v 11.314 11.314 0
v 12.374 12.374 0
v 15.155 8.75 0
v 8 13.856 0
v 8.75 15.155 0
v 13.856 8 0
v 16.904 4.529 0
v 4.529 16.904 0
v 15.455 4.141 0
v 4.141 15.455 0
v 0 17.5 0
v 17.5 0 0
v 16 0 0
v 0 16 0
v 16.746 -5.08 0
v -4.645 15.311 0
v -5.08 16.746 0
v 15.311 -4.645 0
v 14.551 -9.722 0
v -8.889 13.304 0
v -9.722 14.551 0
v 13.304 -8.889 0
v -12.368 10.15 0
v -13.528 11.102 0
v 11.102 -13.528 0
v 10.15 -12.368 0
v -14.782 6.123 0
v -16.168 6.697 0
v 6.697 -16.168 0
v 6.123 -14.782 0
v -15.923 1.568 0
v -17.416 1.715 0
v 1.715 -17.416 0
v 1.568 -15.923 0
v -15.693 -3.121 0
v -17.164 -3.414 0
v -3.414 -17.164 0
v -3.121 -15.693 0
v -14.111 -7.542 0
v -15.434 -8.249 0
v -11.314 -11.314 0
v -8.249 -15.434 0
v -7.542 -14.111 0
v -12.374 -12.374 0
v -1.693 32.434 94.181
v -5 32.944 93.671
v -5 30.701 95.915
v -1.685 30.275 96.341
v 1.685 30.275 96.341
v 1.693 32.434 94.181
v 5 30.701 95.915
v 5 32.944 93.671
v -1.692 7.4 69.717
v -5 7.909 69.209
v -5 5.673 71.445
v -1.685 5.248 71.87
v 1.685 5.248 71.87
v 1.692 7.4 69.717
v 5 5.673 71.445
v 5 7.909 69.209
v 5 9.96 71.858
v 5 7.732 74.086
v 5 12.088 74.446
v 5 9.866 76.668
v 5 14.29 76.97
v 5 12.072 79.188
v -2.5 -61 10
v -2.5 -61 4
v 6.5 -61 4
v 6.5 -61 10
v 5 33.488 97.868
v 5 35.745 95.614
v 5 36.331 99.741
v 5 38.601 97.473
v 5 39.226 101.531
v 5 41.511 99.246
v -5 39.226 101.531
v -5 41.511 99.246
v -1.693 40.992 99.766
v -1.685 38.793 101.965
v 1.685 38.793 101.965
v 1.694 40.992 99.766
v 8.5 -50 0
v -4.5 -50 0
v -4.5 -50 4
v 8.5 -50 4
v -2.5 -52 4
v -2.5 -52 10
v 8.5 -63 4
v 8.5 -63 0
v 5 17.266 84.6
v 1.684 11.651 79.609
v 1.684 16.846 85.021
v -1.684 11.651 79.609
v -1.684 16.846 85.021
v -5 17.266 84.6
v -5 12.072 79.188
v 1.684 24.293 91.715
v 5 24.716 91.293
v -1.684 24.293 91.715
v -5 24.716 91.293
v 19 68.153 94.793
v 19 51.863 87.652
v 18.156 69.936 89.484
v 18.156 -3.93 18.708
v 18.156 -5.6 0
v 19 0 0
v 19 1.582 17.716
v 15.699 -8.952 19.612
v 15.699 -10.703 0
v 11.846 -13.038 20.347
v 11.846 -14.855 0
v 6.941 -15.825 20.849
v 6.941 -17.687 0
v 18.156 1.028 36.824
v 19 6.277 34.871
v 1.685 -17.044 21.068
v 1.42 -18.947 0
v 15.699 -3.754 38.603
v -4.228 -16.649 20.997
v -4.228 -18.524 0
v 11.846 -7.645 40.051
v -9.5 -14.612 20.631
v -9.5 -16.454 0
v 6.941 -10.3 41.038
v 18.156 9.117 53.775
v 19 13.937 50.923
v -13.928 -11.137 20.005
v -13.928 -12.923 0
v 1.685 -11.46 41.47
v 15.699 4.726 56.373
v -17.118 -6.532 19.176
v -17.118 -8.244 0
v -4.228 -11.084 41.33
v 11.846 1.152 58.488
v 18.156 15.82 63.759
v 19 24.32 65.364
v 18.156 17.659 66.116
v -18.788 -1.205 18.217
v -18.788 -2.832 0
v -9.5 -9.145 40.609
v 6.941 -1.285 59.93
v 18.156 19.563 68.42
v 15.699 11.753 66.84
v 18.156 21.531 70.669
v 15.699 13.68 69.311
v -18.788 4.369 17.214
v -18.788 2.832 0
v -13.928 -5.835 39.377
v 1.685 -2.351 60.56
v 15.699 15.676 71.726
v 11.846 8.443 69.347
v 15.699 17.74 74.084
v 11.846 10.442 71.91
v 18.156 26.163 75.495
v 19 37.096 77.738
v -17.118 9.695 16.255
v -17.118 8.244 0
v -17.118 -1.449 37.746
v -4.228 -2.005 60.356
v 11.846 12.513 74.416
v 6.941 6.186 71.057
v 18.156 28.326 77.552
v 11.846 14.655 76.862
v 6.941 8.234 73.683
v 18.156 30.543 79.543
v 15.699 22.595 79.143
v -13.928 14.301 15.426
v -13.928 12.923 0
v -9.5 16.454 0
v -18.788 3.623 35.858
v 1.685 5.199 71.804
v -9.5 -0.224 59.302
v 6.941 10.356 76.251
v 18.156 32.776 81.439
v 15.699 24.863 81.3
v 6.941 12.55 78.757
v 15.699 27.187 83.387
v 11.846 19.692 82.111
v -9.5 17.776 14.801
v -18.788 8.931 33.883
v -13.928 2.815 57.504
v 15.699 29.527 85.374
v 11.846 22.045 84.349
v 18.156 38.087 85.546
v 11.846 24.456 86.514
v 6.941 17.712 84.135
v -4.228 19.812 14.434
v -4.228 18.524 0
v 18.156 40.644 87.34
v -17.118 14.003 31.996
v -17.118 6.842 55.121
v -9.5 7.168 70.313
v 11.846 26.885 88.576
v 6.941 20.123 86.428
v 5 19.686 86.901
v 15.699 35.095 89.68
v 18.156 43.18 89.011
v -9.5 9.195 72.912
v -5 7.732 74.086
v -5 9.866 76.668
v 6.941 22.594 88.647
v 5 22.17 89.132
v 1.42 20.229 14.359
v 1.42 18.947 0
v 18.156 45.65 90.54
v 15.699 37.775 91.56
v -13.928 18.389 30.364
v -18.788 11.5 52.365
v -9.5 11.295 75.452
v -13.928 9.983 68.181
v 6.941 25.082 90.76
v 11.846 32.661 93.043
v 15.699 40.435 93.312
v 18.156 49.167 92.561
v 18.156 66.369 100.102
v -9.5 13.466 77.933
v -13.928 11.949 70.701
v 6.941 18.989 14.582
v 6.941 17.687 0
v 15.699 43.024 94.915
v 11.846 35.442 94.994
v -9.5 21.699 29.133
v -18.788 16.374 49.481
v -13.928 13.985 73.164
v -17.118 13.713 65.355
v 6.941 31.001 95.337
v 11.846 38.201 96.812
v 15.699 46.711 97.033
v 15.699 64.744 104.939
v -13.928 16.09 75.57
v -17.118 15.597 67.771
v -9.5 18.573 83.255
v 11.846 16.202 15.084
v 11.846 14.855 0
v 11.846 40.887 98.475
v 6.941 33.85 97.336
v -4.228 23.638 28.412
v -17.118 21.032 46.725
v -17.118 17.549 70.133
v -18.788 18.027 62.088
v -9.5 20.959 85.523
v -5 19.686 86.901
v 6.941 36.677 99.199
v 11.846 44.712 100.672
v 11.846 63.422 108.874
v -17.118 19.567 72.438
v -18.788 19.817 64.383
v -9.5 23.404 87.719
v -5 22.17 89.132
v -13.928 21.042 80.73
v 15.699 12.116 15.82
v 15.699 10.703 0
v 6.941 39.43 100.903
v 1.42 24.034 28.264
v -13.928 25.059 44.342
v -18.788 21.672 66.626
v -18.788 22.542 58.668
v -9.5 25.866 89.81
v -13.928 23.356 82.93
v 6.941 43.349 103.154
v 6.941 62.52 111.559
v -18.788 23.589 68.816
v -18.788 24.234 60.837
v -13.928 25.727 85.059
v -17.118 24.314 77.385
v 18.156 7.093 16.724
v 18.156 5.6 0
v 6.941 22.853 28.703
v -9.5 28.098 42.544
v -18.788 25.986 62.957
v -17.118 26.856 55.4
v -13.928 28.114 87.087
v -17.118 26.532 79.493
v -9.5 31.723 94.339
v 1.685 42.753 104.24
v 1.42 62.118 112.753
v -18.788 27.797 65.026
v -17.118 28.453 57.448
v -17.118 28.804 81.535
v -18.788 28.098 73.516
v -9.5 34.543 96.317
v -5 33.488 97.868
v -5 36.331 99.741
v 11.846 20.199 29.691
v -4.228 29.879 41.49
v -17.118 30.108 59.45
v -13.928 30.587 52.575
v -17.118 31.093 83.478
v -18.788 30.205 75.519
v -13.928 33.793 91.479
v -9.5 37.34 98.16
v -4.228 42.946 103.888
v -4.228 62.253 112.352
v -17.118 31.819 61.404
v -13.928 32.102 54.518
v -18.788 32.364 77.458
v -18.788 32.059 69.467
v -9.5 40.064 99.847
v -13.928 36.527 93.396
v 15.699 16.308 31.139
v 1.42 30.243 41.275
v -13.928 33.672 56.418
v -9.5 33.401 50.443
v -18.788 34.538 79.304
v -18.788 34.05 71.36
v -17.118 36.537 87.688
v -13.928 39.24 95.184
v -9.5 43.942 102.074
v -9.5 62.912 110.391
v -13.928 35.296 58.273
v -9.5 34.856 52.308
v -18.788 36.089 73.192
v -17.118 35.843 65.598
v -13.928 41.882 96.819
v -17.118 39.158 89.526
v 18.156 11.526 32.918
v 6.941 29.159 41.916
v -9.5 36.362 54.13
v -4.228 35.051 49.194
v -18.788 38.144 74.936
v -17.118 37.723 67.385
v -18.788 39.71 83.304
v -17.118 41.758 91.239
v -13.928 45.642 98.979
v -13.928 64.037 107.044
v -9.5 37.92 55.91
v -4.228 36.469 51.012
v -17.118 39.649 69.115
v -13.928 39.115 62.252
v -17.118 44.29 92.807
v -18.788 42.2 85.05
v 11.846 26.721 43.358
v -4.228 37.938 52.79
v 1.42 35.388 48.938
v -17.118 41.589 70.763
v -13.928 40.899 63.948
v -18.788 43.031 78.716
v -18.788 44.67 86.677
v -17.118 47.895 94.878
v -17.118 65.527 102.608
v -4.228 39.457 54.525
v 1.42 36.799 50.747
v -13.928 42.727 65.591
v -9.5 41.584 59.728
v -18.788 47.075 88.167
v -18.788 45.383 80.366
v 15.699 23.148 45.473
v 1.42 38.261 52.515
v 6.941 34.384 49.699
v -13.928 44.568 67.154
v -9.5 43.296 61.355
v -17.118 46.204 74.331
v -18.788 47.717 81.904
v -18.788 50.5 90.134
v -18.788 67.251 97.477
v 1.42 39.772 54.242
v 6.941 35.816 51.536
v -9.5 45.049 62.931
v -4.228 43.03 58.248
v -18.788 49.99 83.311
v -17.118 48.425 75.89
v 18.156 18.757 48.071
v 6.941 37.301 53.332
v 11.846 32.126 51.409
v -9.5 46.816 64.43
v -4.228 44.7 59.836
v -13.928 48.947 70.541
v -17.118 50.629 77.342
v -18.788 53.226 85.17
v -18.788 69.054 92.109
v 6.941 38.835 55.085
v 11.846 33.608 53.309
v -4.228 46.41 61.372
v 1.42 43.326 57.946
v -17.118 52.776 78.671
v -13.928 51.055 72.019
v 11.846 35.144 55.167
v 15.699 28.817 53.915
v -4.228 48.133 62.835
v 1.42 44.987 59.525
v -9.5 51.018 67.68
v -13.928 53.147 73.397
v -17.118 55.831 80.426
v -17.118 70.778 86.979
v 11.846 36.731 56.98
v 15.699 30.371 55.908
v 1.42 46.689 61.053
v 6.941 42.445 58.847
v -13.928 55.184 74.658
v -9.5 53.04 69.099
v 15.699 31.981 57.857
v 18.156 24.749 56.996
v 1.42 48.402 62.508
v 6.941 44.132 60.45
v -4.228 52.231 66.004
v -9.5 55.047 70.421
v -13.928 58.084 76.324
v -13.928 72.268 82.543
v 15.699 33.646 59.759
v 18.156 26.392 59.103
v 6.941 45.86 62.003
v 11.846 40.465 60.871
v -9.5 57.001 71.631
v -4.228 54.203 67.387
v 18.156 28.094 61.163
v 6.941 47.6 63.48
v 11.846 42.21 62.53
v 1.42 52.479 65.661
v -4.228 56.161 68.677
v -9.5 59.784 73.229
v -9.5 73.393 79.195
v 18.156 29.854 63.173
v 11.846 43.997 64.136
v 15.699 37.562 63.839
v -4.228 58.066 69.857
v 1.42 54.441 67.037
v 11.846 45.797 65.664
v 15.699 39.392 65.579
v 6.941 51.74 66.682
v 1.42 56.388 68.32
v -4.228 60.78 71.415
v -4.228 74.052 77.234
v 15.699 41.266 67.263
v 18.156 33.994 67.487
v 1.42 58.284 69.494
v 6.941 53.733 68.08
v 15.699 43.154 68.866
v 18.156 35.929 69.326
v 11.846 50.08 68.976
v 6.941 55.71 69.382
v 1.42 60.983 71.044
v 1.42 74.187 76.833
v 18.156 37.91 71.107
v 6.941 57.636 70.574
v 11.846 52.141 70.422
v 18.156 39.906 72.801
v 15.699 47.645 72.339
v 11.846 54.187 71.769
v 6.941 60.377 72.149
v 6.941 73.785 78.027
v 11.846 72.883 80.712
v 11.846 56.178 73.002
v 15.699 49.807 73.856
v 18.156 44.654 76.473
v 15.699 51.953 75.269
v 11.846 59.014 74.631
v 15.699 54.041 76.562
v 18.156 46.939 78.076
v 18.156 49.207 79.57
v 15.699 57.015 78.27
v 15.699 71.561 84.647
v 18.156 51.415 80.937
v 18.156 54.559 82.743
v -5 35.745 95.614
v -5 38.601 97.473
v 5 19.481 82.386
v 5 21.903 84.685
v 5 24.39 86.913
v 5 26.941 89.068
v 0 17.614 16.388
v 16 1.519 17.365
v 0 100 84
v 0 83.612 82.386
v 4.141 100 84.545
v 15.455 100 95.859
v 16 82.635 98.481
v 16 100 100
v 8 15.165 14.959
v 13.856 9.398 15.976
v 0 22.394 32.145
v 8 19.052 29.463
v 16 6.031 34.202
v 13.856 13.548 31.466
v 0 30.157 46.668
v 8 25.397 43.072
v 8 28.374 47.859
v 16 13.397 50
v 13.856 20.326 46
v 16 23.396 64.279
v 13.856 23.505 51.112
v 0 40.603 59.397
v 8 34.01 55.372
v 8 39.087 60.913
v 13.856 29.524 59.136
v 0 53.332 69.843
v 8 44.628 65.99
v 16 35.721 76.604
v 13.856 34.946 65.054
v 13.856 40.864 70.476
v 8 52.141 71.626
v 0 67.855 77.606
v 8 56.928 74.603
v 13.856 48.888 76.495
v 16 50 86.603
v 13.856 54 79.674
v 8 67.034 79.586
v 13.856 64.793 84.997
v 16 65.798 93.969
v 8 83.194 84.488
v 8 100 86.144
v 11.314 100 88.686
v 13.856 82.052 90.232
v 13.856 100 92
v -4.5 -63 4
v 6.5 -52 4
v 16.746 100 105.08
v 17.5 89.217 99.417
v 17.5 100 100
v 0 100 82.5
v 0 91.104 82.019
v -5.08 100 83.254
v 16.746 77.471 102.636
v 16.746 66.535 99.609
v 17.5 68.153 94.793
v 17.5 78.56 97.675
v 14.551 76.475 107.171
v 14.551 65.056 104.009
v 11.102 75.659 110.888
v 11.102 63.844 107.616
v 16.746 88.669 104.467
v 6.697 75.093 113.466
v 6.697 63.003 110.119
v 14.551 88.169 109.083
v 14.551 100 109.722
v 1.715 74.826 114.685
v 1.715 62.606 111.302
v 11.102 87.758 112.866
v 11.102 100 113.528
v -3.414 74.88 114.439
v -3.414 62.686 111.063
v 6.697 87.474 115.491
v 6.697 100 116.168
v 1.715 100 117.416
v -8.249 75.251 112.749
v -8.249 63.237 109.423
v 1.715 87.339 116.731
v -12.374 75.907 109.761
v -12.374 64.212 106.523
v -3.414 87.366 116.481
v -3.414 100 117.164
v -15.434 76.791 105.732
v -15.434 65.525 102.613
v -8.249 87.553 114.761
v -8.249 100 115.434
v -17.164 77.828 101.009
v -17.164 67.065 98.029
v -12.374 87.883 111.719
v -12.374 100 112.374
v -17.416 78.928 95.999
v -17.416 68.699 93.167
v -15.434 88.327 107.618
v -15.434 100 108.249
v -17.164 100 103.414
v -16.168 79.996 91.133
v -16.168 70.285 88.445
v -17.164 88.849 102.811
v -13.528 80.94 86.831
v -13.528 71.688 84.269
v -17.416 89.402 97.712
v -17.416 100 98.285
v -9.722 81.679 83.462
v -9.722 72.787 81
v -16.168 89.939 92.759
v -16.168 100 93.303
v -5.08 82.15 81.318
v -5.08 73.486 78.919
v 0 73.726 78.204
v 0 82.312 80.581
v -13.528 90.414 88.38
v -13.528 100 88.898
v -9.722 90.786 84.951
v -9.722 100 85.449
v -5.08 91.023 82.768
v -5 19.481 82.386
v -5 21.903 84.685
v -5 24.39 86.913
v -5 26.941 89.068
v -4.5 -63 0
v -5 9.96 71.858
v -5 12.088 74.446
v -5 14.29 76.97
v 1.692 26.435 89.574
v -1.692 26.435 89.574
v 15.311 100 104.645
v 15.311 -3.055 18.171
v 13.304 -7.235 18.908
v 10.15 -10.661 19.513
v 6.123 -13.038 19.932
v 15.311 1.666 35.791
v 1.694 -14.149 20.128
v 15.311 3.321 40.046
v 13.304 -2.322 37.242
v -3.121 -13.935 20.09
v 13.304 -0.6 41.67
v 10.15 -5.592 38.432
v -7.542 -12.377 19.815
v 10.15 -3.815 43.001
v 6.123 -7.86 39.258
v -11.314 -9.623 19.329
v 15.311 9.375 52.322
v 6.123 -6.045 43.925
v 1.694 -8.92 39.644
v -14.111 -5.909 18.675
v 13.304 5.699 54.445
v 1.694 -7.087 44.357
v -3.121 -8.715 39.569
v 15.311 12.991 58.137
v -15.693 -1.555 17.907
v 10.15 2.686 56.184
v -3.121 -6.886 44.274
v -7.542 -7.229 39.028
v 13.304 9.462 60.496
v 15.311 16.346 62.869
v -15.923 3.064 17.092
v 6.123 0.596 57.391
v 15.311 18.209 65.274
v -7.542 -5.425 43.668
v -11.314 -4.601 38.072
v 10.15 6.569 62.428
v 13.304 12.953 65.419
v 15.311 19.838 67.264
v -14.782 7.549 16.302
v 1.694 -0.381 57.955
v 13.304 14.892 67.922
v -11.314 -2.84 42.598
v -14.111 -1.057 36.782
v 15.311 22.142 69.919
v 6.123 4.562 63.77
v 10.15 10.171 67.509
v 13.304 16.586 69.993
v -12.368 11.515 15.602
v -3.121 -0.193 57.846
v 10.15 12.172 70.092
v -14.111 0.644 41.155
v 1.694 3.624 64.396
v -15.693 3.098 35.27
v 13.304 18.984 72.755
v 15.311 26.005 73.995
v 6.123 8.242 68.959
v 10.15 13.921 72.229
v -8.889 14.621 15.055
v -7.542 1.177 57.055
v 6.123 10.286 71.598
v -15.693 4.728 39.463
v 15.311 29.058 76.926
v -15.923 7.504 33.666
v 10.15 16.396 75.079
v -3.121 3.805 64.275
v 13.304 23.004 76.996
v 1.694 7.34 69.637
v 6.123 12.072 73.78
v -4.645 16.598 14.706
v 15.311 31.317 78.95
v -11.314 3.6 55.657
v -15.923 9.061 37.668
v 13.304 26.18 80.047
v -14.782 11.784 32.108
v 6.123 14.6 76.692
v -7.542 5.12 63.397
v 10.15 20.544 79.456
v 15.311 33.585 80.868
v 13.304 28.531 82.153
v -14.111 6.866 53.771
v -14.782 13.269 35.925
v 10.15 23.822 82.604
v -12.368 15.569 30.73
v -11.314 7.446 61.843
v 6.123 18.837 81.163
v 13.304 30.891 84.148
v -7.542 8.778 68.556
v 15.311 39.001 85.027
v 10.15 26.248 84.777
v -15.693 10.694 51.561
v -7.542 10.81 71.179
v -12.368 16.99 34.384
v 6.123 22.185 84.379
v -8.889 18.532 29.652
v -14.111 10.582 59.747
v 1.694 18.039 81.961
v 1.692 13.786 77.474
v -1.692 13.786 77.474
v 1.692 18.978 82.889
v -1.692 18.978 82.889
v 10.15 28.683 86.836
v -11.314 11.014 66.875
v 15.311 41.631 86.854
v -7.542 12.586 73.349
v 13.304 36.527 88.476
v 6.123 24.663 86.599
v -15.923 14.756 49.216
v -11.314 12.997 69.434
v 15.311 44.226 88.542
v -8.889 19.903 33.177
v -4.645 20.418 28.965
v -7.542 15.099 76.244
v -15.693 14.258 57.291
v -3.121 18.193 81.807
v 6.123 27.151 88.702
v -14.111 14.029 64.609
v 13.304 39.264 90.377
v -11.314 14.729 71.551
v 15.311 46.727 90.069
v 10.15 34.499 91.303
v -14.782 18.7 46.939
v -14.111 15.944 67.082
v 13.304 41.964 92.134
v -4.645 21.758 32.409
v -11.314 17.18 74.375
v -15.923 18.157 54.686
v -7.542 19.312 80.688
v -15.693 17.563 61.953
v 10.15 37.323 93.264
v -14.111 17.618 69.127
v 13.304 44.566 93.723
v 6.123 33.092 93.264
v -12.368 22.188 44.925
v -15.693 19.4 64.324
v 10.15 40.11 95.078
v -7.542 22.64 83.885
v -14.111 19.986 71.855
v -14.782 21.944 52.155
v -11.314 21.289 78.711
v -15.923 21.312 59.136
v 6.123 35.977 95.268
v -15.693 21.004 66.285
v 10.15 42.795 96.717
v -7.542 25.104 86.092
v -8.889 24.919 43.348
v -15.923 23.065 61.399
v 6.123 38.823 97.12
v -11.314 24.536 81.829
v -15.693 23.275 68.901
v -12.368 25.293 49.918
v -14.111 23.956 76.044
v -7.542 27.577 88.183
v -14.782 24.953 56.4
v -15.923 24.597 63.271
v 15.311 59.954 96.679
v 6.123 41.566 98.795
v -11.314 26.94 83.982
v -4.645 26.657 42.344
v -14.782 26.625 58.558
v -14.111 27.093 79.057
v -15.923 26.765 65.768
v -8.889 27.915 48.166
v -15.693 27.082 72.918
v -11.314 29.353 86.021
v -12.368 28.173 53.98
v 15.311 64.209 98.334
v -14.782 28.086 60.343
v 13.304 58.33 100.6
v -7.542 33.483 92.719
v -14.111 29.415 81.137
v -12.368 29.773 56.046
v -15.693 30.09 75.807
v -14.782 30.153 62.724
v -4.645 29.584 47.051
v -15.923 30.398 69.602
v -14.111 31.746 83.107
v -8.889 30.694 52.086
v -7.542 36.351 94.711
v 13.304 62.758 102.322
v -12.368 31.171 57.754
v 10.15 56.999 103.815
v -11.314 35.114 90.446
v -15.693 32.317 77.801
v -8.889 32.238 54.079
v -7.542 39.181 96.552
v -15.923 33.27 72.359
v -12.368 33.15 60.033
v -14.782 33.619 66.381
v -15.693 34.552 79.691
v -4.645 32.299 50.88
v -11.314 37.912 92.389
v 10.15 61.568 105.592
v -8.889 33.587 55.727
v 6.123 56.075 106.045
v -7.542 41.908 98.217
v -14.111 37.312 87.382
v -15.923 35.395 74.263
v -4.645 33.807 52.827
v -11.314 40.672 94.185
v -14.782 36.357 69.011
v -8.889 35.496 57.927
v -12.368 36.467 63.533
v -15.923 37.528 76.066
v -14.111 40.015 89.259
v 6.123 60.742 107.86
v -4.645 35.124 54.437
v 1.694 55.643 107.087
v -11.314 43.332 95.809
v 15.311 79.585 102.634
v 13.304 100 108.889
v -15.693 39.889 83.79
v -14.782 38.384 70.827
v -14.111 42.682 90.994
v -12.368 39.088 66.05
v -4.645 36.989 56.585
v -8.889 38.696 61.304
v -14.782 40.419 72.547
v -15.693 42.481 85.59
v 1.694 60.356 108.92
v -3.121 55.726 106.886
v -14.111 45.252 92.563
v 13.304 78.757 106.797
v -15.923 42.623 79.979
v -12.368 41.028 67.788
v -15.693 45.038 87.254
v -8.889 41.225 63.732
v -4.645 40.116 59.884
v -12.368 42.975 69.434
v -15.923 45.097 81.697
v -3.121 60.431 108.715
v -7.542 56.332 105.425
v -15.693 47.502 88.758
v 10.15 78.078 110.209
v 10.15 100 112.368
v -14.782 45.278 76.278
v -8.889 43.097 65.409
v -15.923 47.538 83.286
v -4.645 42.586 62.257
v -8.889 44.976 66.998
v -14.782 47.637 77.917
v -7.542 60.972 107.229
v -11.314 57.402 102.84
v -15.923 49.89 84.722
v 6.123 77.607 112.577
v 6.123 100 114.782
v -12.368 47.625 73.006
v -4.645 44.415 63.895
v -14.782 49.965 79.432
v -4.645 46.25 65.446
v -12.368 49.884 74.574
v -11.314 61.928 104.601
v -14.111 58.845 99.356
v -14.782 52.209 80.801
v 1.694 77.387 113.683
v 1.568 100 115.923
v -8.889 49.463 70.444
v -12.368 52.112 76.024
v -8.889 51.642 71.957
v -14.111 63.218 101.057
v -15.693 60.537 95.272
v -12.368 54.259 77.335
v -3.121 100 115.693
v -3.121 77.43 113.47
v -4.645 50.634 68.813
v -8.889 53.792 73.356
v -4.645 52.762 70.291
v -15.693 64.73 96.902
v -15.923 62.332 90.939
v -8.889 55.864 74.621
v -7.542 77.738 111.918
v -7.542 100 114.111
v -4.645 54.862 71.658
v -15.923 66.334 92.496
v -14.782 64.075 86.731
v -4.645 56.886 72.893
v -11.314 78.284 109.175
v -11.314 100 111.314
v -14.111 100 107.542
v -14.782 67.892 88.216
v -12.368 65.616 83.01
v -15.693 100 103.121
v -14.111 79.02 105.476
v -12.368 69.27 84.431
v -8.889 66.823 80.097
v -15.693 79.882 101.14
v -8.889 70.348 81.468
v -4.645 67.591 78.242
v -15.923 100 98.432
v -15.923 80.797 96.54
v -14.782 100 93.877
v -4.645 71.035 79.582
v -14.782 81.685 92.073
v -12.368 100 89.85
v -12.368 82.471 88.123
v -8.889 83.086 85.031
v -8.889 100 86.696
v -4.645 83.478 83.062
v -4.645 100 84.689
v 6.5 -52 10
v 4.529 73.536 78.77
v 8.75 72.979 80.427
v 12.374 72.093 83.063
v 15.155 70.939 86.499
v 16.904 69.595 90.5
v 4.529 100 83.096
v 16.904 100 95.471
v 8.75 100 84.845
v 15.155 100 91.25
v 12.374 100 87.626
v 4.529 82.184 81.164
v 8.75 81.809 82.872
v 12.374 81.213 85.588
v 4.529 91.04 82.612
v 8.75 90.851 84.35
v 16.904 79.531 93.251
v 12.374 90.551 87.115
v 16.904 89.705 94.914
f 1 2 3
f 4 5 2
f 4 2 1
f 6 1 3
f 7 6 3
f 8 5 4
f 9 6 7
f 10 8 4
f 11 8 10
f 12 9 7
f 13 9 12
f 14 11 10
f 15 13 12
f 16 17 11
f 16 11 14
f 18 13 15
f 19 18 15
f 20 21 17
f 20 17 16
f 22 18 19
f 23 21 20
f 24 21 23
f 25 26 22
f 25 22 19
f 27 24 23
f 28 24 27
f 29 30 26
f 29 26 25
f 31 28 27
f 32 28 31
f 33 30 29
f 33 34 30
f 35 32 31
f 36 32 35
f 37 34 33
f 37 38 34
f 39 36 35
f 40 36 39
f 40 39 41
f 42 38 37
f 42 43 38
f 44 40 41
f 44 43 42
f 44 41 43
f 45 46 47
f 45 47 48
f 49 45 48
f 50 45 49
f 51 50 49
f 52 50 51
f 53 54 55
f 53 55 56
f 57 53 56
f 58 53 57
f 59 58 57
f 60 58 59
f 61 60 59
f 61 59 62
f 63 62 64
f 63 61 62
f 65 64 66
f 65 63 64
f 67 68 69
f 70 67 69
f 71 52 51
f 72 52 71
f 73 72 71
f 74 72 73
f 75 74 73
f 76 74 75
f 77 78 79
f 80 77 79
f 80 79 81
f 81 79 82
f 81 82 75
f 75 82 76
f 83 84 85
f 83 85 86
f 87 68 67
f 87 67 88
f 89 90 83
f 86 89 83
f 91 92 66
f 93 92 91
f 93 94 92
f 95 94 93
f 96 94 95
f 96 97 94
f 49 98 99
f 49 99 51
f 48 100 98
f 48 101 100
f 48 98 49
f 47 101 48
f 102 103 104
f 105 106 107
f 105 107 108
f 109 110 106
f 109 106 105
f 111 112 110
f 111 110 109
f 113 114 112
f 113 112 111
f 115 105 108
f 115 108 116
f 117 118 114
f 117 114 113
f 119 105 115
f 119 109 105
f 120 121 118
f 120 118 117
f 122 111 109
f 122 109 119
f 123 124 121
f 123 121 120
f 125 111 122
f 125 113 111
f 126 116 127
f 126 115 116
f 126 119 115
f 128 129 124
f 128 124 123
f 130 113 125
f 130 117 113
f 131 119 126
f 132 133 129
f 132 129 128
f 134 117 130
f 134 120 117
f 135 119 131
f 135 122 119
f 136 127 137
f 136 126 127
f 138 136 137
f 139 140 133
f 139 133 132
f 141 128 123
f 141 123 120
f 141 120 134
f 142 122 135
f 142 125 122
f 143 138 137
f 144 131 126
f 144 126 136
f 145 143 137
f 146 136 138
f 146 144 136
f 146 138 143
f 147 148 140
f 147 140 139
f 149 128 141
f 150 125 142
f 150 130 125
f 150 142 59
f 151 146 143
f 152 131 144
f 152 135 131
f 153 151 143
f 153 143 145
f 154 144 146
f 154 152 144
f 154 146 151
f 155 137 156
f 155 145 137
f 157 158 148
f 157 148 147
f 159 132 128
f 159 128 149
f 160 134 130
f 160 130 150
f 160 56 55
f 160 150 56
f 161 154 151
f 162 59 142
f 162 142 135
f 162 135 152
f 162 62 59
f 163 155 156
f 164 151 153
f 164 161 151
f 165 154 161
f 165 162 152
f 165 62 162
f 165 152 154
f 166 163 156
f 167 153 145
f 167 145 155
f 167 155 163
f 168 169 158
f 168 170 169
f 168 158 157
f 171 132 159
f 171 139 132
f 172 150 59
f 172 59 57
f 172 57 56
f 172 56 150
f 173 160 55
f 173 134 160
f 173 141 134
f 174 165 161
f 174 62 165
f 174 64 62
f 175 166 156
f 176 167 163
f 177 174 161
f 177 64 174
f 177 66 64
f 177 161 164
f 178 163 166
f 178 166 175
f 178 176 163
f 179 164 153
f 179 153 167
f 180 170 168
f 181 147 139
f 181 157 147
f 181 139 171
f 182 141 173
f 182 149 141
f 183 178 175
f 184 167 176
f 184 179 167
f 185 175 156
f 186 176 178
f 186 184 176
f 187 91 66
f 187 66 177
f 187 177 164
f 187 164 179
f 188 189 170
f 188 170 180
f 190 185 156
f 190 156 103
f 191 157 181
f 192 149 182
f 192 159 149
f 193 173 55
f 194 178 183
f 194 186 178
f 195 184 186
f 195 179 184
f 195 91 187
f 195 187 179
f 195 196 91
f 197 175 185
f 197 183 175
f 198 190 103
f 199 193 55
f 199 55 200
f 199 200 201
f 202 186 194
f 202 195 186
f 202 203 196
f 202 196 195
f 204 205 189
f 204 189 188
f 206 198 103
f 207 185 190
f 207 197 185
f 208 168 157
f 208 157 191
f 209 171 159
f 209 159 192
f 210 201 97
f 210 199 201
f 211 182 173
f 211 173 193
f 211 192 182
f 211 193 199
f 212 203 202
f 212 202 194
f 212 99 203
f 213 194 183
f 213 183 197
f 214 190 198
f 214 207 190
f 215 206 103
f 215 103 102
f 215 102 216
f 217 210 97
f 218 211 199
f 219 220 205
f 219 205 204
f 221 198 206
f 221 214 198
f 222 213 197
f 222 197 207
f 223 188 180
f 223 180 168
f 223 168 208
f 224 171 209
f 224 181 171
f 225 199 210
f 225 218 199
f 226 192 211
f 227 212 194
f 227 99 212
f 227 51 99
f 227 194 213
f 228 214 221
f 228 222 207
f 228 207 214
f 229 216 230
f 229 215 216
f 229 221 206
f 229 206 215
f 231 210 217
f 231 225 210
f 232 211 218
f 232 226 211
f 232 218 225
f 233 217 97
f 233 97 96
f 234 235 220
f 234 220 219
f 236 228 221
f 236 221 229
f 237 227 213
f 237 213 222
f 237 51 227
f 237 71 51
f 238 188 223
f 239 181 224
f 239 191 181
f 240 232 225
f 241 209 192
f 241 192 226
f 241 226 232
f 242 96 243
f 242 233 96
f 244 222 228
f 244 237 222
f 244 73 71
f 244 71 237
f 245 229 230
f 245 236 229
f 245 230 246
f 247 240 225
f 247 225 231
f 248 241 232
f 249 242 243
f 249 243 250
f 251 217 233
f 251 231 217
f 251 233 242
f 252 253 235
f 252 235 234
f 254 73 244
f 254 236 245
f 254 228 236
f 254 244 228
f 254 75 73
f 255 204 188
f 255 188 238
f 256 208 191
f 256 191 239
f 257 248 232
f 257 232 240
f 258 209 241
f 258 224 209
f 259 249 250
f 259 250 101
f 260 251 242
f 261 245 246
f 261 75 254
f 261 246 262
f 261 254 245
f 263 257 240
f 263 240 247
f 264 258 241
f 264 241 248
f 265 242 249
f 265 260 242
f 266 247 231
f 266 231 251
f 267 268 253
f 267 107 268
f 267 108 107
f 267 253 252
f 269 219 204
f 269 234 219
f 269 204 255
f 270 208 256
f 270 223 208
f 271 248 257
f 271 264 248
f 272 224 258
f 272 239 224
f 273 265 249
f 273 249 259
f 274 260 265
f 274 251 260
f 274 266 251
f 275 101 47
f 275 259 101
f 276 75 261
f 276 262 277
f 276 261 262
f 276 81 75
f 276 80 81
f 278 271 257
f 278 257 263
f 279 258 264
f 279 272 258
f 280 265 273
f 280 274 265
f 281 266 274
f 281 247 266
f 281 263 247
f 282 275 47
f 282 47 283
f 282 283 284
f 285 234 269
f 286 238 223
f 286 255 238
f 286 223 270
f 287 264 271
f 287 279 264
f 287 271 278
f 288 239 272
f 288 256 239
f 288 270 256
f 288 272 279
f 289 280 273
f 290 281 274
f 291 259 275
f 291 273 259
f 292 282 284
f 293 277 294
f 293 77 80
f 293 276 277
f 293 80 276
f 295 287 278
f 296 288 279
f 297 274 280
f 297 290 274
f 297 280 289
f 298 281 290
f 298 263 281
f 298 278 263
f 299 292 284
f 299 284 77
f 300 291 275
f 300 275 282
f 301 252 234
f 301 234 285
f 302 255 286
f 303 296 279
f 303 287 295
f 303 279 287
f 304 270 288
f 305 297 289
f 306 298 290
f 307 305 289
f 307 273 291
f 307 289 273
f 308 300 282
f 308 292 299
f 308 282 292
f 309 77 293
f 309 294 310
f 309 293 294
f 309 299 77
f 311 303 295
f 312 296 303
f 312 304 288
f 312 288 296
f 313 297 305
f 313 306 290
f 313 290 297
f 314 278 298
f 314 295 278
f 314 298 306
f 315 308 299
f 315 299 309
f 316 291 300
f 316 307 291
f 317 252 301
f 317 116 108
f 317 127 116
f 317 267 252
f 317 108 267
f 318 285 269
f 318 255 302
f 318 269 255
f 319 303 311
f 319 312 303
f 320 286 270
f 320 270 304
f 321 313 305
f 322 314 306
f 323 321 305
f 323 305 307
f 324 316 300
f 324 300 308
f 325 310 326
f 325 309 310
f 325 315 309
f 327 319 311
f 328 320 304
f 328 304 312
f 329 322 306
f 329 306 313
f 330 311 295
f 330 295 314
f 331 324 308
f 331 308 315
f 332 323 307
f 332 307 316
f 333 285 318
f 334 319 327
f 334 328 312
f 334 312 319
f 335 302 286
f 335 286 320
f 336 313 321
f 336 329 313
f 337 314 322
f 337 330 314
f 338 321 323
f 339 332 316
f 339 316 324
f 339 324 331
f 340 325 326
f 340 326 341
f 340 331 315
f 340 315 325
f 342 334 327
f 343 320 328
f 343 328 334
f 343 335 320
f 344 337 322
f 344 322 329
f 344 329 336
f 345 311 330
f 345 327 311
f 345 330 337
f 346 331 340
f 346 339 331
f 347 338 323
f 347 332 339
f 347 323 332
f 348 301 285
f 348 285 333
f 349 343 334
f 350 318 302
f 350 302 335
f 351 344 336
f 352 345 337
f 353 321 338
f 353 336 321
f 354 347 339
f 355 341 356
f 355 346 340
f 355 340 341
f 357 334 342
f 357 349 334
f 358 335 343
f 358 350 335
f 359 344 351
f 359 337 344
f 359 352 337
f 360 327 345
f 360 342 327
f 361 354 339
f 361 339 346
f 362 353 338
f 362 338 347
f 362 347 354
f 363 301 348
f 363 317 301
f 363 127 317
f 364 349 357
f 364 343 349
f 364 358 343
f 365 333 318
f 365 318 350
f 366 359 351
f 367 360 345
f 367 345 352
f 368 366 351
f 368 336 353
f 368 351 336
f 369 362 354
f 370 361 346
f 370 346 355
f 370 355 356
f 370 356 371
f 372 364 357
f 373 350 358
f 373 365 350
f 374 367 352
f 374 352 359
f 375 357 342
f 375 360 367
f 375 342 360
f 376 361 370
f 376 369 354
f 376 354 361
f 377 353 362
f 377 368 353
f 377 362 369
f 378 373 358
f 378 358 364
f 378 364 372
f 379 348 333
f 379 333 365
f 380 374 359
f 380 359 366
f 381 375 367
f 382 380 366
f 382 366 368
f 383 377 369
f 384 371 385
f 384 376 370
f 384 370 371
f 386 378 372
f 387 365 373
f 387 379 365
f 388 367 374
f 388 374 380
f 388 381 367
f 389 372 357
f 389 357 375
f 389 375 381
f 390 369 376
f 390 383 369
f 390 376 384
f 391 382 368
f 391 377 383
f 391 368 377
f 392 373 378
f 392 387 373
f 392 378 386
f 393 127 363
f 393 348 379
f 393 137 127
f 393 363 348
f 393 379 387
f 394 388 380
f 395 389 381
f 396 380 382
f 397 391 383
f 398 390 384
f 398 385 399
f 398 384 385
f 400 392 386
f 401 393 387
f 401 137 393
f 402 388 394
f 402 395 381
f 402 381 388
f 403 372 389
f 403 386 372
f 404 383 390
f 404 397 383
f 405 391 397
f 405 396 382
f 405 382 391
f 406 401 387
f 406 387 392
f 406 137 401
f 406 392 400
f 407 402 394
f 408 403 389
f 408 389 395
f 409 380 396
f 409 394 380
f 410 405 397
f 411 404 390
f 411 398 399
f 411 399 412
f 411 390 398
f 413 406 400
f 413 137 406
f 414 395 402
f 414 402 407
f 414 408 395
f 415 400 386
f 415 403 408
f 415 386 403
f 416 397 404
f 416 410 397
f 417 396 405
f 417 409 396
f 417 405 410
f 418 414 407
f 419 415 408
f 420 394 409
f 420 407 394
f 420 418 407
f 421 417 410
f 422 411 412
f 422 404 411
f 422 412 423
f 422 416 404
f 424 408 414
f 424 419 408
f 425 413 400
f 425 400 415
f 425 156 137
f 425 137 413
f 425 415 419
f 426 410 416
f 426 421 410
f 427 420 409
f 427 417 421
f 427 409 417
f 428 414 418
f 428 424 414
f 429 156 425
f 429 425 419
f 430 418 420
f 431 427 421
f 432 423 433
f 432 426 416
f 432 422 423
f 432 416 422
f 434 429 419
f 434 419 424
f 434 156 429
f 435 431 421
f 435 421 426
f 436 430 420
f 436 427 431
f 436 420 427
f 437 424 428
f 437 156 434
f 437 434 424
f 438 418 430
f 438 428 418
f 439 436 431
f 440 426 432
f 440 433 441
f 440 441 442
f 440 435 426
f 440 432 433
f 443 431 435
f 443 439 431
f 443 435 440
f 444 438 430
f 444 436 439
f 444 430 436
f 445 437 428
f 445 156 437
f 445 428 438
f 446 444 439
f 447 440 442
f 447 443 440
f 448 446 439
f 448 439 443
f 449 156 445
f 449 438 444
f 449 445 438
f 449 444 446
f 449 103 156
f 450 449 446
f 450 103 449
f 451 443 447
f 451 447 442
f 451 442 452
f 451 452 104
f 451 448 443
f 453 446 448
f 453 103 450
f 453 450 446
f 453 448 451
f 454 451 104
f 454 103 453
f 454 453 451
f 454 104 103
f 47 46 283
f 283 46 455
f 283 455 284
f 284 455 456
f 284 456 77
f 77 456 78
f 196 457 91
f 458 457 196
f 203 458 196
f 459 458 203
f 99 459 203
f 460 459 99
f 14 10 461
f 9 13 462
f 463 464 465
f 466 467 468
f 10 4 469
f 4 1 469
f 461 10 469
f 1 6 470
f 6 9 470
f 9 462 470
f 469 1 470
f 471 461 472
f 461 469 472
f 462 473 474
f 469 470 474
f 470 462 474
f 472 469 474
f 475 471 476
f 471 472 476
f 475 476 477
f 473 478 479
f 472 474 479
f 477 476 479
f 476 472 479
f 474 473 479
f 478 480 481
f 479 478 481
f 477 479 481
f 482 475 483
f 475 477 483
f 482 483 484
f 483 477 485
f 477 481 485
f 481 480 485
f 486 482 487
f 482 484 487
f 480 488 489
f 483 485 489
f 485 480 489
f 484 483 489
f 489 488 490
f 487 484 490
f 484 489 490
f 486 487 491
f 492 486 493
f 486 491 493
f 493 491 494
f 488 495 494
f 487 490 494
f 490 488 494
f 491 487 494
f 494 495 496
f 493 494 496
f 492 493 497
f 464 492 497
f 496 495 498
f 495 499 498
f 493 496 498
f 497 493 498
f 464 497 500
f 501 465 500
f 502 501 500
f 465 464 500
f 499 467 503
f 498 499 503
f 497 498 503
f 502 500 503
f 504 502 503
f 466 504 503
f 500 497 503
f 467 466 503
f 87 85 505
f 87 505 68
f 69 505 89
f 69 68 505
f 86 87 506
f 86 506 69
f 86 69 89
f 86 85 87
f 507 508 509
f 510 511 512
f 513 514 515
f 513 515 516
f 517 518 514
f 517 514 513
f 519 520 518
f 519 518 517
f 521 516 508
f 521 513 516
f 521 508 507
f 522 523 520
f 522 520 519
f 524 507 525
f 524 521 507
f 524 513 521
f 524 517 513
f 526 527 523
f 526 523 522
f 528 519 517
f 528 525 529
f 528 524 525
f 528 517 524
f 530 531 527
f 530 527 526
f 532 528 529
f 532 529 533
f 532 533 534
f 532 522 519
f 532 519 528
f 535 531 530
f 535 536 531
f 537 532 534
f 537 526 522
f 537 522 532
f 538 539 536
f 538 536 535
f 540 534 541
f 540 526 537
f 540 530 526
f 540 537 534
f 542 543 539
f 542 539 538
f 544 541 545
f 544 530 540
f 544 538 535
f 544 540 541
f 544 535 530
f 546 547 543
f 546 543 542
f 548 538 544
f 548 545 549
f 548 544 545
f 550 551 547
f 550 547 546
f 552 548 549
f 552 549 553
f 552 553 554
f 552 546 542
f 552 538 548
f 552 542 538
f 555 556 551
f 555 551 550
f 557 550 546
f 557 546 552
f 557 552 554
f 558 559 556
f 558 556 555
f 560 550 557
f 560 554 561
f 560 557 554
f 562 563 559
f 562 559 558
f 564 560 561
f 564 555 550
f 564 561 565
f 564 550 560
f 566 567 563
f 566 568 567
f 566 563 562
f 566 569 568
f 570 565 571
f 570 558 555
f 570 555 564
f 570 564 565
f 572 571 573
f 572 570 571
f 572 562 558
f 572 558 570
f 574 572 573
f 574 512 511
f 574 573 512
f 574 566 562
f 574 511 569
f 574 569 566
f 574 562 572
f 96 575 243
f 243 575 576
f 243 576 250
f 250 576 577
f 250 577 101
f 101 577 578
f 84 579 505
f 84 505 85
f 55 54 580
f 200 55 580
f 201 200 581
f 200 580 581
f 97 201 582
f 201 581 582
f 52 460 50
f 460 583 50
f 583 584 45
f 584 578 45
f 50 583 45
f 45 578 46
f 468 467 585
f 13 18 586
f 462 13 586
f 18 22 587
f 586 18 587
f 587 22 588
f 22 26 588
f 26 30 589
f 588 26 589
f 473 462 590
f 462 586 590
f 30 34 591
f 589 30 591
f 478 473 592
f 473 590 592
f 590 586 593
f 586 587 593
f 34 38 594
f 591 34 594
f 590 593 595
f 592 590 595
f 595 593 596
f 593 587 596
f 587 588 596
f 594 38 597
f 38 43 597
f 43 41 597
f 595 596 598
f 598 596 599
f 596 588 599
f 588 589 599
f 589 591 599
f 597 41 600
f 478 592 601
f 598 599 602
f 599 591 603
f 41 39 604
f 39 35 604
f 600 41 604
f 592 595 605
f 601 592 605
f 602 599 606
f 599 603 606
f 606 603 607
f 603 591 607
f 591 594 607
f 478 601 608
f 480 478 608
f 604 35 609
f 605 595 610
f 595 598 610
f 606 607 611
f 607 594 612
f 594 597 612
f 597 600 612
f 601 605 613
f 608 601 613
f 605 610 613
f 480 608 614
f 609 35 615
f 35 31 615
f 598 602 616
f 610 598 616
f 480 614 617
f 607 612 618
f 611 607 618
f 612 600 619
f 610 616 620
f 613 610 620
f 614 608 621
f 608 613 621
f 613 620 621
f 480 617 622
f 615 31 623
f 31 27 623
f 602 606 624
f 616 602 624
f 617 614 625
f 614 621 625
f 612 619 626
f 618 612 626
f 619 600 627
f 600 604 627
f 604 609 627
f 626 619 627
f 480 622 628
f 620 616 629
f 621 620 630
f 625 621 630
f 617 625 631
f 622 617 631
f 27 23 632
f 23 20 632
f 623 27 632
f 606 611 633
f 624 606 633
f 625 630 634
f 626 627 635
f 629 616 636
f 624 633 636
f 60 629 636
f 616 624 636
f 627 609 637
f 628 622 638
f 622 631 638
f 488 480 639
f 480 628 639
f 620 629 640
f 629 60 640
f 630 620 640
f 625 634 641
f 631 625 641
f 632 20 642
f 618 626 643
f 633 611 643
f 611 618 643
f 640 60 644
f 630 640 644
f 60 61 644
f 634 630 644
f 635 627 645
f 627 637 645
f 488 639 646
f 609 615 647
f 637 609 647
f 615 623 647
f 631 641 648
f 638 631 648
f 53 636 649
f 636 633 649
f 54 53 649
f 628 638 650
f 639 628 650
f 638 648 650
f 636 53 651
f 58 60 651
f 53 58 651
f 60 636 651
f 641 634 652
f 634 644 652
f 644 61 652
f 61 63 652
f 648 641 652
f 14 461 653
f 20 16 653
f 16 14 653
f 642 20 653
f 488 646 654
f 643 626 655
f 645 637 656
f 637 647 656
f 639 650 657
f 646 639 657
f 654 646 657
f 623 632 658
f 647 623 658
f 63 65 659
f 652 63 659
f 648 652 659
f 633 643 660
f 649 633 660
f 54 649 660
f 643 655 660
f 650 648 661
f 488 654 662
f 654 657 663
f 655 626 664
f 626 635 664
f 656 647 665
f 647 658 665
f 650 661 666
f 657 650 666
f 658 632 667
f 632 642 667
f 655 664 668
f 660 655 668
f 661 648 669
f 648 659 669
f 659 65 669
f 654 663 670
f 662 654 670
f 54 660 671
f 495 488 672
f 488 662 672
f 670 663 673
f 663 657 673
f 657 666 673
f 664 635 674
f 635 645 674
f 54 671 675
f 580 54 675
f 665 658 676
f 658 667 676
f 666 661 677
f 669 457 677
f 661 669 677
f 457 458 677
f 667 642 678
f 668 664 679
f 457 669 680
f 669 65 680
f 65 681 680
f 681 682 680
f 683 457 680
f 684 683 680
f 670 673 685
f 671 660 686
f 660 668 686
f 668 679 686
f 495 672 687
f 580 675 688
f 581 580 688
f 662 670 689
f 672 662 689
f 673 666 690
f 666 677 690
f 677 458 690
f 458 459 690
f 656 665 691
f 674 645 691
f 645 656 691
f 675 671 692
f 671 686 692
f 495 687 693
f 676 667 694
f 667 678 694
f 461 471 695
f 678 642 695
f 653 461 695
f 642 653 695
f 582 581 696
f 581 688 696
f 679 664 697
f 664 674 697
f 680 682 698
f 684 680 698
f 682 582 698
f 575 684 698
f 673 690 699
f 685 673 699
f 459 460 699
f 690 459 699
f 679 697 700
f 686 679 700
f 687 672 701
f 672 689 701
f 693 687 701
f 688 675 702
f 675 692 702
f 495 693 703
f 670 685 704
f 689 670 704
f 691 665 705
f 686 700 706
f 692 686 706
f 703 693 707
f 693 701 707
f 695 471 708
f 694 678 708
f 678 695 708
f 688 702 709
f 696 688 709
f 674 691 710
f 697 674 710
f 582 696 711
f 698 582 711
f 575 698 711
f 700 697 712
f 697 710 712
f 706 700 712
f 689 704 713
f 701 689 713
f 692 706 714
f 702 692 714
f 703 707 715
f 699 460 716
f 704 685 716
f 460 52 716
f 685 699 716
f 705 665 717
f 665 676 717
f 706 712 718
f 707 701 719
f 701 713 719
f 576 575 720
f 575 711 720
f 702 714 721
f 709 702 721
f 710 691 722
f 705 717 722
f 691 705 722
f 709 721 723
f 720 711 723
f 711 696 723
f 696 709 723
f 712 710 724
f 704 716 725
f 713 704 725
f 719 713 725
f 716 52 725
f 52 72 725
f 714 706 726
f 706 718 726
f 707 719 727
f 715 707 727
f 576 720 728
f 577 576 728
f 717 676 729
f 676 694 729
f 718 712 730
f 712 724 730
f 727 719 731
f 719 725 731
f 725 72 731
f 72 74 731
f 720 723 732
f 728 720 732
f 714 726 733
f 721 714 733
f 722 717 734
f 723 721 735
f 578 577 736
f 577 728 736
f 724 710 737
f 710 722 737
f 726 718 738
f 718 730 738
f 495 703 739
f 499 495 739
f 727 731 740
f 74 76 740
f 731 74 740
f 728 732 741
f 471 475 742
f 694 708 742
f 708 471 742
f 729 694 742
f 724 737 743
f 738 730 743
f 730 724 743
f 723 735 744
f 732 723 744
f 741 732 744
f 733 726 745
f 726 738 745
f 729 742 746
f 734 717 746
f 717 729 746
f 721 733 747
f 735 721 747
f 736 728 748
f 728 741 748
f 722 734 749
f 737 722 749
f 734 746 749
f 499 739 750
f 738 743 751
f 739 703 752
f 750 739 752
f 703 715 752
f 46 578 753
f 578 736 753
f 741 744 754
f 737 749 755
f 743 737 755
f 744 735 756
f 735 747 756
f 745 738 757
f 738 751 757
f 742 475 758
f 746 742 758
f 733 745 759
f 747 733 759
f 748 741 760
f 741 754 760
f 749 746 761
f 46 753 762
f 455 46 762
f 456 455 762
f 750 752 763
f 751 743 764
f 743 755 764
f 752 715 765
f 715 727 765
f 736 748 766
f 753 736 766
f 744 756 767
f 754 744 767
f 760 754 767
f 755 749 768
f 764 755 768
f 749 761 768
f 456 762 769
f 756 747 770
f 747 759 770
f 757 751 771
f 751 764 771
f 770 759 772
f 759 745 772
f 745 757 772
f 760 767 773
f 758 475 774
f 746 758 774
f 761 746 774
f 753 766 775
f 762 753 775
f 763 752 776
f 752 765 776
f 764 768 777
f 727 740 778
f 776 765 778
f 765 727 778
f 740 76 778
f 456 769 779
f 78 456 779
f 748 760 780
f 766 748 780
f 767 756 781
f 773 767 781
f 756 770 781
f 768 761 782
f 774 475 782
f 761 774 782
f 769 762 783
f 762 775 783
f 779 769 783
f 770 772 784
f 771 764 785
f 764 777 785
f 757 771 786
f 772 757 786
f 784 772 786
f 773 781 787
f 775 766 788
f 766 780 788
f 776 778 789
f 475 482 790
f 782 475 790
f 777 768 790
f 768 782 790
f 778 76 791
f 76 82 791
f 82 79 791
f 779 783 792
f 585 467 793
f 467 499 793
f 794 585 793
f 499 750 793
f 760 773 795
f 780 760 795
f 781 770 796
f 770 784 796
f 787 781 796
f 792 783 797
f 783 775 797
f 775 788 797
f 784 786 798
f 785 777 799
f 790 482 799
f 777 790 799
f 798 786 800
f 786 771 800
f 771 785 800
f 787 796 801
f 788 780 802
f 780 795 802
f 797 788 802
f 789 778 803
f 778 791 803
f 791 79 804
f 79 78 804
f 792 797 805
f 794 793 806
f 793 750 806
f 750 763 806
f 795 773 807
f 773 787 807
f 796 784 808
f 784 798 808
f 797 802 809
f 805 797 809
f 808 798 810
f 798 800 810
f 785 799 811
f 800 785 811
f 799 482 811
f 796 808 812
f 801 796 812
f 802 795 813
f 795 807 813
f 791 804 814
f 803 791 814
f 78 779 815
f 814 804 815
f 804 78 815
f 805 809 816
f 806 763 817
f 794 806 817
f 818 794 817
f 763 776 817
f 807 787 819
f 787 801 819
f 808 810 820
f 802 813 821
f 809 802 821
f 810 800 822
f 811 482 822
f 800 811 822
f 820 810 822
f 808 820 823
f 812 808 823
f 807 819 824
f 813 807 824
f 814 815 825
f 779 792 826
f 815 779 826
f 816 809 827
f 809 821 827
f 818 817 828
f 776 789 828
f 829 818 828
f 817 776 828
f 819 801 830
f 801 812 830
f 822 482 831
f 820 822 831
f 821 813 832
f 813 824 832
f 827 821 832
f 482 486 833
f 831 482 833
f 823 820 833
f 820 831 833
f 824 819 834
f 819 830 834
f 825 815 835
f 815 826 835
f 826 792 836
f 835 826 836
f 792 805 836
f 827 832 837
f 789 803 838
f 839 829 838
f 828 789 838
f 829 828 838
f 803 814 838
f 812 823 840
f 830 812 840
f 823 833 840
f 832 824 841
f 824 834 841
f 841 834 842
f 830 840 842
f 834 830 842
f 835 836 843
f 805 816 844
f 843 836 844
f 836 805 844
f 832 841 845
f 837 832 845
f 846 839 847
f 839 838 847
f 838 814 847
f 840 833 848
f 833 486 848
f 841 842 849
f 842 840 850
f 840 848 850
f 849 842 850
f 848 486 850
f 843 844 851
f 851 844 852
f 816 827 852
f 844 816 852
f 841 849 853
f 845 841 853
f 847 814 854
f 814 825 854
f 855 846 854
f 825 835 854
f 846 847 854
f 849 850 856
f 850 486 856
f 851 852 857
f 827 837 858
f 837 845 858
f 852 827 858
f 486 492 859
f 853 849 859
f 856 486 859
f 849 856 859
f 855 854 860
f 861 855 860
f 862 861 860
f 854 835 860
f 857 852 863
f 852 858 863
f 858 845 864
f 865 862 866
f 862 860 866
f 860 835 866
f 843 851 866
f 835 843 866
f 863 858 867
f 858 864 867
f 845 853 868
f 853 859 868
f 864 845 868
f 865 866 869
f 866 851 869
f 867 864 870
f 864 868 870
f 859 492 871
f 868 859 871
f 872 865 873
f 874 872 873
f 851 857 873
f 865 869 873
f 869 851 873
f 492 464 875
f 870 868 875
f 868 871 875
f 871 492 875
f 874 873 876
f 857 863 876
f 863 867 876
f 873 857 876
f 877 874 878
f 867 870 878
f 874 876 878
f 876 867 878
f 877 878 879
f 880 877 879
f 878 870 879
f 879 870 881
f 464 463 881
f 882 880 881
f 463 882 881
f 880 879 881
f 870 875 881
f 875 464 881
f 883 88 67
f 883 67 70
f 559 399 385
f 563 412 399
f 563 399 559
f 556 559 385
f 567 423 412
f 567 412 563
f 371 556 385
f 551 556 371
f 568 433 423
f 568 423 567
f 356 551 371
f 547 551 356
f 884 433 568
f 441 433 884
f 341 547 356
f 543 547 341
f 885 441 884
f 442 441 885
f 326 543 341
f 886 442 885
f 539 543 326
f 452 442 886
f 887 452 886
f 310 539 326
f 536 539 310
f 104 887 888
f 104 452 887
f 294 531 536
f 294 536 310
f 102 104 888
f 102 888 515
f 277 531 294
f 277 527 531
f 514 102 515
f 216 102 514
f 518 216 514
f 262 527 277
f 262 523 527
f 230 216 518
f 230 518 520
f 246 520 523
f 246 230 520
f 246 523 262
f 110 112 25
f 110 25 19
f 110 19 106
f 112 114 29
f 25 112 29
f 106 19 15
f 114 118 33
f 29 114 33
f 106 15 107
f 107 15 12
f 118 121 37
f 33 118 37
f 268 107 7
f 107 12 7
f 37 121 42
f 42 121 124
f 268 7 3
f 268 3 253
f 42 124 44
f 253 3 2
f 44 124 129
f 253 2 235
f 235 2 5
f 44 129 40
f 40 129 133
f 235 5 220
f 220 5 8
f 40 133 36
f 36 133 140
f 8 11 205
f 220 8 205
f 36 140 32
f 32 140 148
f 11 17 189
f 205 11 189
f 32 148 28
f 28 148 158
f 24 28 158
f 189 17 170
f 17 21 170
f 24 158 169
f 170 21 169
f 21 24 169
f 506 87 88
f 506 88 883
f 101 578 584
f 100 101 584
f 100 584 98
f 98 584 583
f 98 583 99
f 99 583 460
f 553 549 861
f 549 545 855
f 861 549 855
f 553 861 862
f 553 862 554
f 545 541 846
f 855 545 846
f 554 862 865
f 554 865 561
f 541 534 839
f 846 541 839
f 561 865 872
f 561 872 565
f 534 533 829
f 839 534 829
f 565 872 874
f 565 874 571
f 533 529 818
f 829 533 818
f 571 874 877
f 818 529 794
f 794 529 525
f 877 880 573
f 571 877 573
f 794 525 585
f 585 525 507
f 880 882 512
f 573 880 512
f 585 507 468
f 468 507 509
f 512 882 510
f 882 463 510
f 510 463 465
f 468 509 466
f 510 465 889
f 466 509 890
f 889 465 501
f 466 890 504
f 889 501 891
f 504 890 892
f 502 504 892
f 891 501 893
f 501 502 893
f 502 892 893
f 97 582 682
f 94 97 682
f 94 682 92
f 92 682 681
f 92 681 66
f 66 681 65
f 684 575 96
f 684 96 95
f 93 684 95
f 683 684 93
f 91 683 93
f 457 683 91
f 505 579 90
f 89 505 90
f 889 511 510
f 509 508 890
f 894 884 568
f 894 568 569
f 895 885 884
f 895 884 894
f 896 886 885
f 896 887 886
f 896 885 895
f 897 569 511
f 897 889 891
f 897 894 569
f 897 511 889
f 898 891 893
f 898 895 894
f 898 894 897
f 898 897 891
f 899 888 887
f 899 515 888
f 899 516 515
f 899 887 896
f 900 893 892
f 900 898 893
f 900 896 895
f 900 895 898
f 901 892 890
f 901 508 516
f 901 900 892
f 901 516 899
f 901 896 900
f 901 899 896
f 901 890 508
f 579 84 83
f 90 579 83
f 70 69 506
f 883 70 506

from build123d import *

# Parameters (mm, degrees)
F1_R      = 19
F1_R_2    = 17.5
F10_START = 25
F9_W      = 10
F9_H      = 10
F10_DEPTH = 25
F11_W     = 9
F11_H     = 9
F12_DEPTH = 10
F11_W_2   = 13
F11_H_2   = 13
F13_DEPTH = 4


with BuildPart() as f6:
    # F6: sweep along a path in F2
    with BuildLine(Plane.YZ) as f6_path:
        ThreePointArc((0, 0), (29.2893218813, 70.7106781187), (100, 100))
    # F3 (on offset) → F6 (sweep)
    with BuildSketch(Plane.XZ.offset(-100)):
        with BuildLine():
            ThreePointArc((17.5, 100), (-12.3743686708, 112.3743686708), (0, 82.5))
            ThreePointArc((0, 82.5), (12.3743686708, 87.6256313292), (17.5, 100))
        make_face()
        with BuildLine():
            ThreePointArc((16, 100), (11.313708499, 88.686291501), (0, 84))
            ThreePointArc((0, 84), (-11.313708499, 111.313708499), (16, 100))
        make_face(mode=Mode.SUBTRACT)
    sweep(path=f6_path.line)

    # F7: sweep along a path in F4
    with BuildLine(Plane.YZ) as f7_path:
        ThreePointArc((0, 0), (18.8065617346, 58.3748711574), (68.152511653, 94.7931299514))
    # F1 (on Top) → F7 (sweep)
    with BuildSketch(Plane.XY):
        Circle(F1_R)
        Circle(F1_R_2, mode=Mode.SUBTRACT)
    sweep(path=f7_path.line)

    # F9 (on face) → F10 (cut)
    with BuildSketch(Plane(origin=(0, 0, 0), x_dir=(1, 0, 0), z_dir=(0, -0.7071067812, 0.7071067812)).offset(F10_START)):
        with Locations((0, 94.5305745304)):
            Rectangle(F9_W, F9_H)
        with Locations((0, 77.0305745304)):
            Rectangle(F9_W, F9_H)
        with Locations((0, 59.5305745304)):
            Rectangle(F9_W, F9_H)
    extrude(amount=F10_DEPTH, mode=Mode.SUBTRACT)


with BuildPart() as f12:
    # F11 (on Top) → F12 (new body)
    with BuildSketch(Plane.XY):
        with Locations((2, -56.5)):
            Rectangle(F11_W, F11_H)
    extrude(amount=F12_DEPTH)

    # F11 (on Top) → F13 (join)
    with BuildSketch(Plane.XY):
        with Locations((2, -56.5)):
            Rectangle(F11_W_2, F11_H_2)
        with Locations((2, -56.5)):
            Rectangle(F11_W, F11_H, mode=Mode.SUBTRACT)
    extrude(amount=F13_DEPTH)


solid = Compound([f6.part, f12.part])
